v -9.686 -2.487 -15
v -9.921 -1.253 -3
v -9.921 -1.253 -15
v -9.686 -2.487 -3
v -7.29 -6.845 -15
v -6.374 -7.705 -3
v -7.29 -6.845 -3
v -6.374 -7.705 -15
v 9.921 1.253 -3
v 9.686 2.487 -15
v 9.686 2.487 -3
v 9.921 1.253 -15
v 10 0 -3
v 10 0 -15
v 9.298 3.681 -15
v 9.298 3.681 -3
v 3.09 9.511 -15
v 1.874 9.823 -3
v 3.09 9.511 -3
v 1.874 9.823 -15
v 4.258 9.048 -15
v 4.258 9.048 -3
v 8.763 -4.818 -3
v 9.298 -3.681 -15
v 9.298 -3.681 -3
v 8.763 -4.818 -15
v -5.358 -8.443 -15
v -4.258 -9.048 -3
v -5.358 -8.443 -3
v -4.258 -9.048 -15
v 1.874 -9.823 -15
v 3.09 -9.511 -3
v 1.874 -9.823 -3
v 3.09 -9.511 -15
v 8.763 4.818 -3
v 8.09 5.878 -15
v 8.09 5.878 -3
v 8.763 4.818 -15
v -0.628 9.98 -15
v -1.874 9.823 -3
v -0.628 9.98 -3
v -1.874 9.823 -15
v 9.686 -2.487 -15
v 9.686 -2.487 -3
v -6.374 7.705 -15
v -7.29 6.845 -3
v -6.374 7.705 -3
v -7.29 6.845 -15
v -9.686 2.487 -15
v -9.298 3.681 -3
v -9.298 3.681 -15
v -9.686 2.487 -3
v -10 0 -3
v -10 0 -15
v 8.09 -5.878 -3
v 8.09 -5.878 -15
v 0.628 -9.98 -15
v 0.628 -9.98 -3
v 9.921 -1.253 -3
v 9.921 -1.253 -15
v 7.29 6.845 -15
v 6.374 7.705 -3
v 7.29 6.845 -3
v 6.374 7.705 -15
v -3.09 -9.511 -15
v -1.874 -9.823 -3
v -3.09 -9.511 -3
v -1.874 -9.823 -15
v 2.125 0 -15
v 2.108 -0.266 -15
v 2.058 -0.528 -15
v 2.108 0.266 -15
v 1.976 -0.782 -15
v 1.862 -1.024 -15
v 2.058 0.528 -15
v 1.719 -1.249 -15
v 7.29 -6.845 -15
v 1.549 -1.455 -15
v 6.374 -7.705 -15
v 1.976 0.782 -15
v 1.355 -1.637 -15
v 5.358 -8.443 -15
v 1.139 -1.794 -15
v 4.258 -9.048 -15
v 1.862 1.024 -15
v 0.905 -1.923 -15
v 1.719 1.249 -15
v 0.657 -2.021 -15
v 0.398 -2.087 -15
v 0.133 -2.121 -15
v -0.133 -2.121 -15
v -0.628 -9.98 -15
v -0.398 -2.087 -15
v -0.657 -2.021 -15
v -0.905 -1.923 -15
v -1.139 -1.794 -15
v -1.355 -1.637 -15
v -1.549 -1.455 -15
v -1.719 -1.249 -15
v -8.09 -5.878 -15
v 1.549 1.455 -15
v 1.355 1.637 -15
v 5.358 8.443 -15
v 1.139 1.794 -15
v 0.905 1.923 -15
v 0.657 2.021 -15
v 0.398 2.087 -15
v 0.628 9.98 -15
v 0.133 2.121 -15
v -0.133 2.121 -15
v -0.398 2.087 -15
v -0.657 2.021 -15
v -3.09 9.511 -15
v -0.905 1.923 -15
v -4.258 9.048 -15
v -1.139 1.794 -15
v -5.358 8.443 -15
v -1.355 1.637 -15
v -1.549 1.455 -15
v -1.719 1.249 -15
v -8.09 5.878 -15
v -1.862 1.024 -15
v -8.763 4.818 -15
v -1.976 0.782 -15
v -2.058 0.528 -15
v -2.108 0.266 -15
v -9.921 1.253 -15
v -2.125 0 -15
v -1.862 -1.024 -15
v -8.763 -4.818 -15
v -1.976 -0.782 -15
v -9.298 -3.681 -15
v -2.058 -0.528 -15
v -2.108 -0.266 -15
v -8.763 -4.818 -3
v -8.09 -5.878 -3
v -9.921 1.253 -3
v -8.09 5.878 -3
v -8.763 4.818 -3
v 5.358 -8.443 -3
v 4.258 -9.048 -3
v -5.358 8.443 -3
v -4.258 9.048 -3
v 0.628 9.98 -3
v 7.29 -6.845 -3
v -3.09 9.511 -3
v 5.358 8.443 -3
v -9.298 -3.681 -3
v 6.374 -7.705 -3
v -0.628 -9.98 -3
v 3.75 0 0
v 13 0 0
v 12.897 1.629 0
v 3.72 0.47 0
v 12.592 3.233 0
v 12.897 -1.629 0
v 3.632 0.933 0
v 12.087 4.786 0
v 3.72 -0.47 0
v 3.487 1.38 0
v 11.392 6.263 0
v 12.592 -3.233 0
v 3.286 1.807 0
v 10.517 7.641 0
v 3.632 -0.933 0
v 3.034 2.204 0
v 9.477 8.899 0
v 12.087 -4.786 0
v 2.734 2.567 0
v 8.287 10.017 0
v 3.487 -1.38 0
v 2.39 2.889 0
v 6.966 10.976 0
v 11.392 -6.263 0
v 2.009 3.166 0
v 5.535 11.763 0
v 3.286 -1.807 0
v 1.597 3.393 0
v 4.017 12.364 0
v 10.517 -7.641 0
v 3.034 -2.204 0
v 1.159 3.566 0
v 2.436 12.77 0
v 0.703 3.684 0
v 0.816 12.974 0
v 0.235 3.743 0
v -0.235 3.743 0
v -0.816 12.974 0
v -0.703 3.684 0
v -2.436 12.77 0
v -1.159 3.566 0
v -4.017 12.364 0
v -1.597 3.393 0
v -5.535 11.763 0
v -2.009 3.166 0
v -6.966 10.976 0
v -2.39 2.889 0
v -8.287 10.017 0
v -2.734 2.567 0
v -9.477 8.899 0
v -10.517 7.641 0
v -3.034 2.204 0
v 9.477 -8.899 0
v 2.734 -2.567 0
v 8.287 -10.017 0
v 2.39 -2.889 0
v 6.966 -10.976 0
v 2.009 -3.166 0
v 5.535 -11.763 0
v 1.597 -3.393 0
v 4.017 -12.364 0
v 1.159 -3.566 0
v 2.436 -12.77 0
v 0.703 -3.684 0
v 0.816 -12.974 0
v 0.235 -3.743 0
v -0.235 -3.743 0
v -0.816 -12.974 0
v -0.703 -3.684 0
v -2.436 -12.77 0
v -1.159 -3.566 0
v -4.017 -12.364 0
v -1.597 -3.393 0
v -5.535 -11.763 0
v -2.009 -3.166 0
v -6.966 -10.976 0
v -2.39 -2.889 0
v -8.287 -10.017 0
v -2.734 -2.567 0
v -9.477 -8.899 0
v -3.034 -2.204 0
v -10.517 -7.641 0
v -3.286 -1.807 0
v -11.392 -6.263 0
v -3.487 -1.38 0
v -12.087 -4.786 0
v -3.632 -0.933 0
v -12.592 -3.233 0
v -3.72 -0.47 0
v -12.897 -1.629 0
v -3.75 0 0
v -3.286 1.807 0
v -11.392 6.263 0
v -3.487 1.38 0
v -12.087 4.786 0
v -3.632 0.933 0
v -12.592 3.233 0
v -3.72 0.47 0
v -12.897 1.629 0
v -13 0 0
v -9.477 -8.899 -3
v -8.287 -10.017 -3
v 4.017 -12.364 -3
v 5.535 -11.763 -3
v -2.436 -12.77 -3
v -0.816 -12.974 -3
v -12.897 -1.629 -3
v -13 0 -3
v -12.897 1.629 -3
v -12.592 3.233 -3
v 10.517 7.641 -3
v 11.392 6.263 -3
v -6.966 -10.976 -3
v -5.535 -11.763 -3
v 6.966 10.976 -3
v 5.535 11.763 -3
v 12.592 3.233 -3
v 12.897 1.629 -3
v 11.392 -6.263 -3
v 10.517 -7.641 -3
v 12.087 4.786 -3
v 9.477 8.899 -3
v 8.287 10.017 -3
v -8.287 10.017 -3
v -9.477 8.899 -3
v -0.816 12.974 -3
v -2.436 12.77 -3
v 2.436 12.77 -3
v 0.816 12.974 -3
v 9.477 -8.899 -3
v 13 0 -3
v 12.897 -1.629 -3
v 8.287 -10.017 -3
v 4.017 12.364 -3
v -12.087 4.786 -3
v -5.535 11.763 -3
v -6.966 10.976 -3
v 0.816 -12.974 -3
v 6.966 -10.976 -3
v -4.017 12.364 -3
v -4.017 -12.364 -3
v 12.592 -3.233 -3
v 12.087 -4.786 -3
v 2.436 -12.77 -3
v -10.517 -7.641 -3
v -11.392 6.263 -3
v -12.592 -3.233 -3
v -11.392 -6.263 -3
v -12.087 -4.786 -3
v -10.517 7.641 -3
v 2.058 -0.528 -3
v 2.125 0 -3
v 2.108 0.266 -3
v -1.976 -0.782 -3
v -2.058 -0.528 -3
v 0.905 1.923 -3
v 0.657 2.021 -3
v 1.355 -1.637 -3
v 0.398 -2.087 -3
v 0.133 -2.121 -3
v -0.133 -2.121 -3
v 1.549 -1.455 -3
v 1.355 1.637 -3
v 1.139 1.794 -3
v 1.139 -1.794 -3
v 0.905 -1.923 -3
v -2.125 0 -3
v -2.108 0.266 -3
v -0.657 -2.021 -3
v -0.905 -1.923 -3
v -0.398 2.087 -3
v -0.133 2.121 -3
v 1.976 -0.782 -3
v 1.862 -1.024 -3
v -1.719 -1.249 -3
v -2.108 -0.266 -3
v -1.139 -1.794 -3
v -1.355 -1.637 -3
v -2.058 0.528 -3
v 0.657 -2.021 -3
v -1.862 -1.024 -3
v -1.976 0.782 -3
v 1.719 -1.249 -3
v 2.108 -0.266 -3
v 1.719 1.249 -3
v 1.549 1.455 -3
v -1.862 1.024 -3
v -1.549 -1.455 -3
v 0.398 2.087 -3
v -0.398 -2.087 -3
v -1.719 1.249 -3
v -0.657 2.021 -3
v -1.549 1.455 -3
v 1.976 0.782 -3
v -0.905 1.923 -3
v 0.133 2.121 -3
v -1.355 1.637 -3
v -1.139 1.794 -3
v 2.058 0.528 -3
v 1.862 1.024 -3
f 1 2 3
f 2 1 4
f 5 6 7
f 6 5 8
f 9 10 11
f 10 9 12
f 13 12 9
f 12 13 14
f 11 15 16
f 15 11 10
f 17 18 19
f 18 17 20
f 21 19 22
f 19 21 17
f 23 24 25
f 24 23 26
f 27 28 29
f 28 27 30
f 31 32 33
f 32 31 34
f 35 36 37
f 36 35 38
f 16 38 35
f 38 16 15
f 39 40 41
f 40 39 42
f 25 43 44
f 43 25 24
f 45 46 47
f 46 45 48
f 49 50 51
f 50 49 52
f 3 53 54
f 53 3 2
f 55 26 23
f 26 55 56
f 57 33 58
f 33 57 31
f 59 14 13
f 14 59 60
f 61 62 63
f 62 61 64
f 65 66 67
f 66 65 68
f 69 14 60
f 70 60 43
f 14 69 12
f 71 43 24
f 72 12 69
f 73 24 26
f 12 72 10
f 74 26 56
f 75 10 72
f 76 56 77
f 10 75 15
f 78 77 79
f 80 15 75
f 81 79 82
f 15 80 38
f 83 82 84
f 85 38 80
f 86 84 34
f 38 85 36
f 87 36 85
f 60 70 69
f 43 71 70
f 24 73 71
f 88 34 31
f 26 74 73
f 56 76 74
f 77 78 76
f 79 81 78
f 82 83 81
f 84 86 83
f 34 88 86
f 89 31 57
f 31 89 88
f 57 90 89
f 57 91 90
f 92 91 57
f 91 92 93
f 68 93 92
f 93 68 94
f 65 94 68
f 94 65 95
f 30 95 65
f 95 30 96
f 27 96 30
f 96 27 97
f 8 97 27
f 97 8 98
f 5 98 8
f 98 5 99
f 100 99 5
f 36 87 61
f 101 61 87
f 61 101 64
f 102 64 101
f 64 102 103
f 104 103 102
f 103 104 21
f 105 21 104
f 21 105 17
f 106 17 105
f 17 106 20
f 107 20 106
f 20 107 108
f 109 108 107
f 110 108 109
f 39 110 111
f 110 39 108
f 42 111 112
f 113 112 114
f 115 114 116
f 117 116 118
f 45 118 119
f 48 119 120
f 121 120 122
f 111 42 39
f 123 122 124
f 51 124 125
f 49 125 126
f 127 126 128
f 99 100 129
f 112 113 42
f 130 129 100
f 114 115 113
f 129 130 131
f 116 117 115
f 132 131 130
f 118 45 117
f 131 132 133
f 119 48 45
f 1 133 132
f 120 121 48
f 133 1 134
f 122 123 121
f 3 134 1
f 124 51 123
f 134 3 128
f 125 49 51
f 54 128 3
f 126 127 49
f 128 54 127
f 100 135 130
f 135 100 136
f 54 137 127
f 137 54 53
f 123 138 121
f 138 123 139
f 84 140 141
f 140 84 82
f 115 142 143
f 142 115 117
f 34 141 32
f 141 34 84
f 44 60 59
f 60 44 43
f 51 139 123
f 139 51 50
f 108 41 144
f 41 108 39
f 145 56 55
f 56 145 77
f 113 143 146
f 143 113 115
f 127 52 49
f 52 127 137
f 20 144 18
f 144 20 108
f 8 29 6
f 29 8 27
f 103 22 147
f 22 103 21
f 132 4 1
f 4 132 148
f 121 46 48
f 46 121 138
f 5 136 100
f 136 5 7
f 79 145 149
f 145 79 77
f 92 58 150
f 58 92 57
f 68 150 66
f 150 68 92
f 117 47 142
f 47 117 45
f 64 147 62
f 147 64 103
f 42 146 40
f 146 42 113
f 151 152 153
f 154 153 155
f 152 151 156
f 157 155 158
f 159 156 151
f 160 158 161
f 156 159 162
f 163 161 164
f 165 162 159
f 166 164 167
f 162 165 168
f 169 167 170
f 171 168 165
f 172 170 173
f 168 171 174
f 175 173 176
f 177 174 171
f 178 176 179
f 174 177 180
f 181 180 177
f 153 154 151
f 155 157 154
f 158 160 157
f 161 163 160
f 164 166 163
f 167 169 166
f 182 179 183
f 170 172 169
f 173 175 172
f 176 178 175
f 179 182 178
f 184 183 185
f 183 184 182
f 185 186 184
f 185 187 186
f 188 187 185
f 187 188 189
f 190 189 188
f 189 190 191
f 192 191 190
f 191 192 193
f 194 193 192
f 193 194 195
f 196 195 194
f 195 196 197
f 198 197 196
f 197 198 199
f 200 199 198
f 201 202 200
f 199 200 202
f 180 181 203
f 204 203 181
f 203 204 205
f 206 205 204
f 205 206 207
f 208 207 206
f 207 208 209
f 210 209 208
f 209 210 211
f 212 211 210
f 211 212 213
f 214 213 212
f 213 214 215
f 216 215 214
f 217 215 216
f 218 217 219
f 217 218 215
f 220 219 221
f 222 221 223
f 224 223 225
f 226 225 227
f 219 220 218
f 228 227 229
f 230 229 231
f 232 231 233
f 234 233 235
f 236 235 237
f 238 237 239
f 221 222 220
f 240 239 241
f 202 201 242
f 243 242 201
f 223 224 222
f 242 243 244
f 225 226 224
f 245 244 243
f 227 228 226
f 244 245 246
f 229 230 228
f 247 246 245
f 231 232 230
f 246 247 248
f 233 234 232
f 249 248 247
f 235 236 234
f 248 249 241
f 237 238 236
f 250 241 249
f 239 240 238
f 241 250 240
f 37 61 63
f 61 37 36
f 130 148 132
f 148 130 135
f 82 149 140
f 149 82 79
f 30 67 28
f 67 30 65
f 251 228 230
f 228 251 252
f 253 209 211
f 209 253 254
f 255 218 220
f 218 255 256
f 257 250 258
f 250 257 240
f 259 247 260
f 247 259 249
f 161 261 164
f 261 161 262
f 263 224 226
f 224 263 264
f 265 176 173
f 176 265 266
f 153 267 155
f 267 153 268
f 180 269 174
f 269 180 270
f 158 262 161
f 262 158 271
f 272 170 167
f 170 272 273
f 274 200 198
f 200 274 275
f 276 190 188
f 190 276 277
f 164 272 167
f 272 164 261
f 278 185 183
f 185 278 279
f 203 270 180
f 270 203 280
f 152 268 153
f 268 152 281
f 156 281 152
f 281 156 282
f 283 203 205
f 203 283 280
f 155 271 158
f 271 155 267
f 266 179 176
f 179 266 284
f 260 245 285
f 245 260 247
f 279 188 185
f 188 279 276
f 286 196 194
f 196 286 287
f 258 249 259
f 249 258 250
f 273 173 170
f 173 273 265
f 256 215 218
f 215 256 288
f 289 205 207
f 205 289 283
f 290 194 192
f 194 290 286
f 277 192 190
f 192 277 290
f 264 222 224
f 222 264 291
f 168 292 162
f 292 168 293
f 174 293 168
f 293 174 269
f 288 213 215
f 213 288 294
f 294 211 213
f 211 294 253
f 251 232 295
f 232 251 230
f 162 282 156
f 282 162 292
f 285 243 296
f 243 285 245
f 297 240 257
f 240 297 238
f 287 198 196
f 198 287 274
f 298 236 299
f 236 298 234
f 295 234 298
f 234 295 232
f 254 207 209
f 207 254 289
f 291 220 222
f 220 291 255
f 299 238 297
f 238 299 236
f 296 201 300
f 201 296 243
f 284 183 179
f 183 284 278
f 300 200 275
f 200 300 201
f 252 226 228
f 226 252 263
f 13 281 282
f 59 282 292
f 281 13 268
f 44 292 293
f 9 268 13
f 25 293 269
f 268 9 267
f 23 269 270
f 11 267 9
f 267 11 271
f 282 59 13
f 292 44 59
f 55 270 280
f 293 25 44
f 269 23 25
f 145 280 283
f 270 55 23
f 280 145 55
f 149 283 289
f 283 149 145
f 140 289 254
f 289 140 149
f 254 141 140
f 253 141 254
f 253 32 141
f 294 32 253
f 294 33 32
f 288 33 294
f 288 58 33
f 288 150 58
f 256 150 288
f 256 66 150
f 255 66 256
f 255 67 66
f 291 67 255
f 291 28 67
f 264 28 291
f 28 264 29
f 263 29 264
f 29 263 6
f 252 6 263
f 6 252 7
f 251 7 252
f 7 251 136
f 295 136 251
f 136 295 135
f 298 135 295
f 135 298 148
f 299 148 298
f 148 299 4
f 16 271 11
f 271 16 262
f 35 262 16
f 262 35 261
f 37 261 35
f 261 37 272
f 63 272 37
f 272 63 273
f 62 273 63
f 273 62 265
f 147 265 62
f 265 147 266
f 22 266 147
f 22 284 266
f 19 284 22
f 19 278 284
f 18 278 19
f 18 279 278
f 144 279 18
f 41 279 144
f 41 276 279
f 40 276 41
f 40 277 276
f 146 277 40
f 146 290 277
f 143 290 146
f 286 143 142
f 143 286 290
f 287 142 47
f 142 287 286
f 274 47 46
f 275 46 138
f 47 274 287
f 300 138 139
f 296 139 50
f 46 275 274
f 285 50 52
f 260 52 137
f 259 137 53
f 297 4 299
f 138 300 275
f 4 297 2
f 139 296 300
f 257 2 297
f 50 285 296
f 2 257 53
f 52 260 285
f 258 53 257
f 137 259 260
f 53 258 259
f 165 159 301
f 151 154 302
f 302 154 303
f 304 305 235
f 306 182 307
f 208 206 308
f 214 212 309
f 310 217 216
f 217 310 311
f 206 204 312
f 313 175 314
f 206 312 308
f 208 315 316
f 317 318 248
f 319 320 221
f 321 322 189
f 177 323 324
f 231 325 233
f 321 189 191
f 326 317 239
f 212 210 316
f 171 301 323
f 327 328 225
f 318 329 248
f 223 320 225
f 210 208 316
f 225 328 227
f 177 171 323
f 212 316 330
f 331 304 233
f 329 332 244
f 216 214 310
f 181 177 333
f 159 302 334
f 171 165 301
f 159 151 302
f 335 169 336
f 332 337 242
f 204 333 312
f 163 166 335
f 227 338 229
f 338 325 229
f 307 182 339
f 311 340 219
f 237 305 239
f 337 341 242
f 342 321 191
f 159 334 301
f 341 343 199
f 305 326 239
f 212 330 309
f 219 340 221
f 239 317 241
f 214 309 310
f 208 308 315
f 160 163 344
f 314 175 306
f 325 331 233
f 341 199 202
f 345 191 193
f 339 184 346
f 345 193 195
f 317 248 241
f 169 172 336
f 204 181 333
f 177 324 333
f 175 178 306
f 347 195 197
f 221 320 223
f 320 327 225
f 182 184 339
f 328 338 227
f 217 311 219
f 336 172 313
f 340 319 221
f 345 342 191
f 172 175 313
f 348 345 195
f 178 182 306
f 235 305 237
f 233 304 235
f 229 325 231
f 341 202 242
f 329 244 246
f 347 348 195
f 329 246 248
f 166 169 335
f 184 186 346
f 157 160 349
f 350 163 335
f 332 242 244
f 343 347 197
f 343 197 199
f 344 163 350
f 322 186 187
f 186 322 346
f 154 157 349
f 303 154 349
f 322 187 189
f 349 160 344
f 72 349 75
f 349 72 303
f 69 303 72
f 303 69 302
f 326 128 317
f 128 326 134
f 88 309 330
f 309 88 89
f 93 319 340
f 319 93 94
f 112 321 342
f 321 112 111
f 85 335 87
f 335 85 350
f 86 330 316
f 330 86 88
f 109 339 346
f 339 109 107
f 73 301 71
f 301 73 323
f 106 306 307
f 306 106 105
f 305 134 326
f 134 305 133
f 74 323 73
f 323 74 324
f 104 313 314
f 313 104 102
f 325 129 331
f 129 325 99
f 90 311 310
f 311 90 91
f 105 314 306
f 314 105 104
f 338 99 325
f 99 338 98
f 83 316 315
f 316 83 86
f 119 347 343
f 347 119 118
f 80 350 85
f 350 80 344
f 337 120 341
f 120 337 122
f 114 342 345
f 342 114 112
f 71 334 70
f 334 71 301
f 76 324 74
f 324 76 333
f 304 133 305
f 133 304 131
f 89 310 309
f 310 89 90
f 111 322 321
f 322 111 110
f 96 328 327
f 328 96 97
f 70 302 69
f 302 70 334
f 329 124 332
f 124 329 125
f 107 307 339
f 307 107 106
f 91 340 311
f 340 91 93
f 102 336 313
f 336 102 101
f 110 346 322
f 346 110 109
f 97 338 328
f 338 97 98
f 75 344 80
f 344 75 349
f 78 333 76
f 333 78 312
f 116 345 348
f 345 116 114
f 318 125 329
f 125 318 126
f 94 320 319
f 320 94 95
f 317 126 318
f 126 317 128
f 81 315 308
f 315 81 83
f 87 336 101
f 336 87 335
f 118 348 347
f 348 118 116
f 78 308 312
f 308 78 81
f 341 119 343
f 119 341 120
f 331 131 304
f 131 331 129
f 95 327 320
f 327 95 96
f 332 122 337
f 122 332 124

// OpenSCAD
$fn = 50;


difference() {
	union() {
		translate(v = [0, 0, -15.0000000000]) {
			cylinder(h = 15, r = 10.0000000000);
		}
		translate(v = [0, 0, -3.0000000000]) {
			cylinder(h = 3, r = 13.0000000000);
		}
	}
	union() {
		translate(v = [0, 0, 0]) {
			rotate(a = [0, 0, 0]) {
				difference() {
					union() {
						#translate(v = [0, 0, -15.0000000000]) {
							cylinder(h = 15, r = 2.0000000000);
						}
						#translate(v = [0, 0, -3]) {
							cylinder(h = 3, r = 10.0000000000, r1 = 2.1250000000, r2 = 3.7500000000);
						}
						#translate(v = [0, 0, -15.0000000000]) {
							cylinder(h = 15, r = 2.1250000000);
						}
						#translate(v = [0, 0, -15.0000000000]) {
							cylinder(h = 15, r = 2.0000000000);
						}
					}
					union();
				}
			}
		}
	}
}
